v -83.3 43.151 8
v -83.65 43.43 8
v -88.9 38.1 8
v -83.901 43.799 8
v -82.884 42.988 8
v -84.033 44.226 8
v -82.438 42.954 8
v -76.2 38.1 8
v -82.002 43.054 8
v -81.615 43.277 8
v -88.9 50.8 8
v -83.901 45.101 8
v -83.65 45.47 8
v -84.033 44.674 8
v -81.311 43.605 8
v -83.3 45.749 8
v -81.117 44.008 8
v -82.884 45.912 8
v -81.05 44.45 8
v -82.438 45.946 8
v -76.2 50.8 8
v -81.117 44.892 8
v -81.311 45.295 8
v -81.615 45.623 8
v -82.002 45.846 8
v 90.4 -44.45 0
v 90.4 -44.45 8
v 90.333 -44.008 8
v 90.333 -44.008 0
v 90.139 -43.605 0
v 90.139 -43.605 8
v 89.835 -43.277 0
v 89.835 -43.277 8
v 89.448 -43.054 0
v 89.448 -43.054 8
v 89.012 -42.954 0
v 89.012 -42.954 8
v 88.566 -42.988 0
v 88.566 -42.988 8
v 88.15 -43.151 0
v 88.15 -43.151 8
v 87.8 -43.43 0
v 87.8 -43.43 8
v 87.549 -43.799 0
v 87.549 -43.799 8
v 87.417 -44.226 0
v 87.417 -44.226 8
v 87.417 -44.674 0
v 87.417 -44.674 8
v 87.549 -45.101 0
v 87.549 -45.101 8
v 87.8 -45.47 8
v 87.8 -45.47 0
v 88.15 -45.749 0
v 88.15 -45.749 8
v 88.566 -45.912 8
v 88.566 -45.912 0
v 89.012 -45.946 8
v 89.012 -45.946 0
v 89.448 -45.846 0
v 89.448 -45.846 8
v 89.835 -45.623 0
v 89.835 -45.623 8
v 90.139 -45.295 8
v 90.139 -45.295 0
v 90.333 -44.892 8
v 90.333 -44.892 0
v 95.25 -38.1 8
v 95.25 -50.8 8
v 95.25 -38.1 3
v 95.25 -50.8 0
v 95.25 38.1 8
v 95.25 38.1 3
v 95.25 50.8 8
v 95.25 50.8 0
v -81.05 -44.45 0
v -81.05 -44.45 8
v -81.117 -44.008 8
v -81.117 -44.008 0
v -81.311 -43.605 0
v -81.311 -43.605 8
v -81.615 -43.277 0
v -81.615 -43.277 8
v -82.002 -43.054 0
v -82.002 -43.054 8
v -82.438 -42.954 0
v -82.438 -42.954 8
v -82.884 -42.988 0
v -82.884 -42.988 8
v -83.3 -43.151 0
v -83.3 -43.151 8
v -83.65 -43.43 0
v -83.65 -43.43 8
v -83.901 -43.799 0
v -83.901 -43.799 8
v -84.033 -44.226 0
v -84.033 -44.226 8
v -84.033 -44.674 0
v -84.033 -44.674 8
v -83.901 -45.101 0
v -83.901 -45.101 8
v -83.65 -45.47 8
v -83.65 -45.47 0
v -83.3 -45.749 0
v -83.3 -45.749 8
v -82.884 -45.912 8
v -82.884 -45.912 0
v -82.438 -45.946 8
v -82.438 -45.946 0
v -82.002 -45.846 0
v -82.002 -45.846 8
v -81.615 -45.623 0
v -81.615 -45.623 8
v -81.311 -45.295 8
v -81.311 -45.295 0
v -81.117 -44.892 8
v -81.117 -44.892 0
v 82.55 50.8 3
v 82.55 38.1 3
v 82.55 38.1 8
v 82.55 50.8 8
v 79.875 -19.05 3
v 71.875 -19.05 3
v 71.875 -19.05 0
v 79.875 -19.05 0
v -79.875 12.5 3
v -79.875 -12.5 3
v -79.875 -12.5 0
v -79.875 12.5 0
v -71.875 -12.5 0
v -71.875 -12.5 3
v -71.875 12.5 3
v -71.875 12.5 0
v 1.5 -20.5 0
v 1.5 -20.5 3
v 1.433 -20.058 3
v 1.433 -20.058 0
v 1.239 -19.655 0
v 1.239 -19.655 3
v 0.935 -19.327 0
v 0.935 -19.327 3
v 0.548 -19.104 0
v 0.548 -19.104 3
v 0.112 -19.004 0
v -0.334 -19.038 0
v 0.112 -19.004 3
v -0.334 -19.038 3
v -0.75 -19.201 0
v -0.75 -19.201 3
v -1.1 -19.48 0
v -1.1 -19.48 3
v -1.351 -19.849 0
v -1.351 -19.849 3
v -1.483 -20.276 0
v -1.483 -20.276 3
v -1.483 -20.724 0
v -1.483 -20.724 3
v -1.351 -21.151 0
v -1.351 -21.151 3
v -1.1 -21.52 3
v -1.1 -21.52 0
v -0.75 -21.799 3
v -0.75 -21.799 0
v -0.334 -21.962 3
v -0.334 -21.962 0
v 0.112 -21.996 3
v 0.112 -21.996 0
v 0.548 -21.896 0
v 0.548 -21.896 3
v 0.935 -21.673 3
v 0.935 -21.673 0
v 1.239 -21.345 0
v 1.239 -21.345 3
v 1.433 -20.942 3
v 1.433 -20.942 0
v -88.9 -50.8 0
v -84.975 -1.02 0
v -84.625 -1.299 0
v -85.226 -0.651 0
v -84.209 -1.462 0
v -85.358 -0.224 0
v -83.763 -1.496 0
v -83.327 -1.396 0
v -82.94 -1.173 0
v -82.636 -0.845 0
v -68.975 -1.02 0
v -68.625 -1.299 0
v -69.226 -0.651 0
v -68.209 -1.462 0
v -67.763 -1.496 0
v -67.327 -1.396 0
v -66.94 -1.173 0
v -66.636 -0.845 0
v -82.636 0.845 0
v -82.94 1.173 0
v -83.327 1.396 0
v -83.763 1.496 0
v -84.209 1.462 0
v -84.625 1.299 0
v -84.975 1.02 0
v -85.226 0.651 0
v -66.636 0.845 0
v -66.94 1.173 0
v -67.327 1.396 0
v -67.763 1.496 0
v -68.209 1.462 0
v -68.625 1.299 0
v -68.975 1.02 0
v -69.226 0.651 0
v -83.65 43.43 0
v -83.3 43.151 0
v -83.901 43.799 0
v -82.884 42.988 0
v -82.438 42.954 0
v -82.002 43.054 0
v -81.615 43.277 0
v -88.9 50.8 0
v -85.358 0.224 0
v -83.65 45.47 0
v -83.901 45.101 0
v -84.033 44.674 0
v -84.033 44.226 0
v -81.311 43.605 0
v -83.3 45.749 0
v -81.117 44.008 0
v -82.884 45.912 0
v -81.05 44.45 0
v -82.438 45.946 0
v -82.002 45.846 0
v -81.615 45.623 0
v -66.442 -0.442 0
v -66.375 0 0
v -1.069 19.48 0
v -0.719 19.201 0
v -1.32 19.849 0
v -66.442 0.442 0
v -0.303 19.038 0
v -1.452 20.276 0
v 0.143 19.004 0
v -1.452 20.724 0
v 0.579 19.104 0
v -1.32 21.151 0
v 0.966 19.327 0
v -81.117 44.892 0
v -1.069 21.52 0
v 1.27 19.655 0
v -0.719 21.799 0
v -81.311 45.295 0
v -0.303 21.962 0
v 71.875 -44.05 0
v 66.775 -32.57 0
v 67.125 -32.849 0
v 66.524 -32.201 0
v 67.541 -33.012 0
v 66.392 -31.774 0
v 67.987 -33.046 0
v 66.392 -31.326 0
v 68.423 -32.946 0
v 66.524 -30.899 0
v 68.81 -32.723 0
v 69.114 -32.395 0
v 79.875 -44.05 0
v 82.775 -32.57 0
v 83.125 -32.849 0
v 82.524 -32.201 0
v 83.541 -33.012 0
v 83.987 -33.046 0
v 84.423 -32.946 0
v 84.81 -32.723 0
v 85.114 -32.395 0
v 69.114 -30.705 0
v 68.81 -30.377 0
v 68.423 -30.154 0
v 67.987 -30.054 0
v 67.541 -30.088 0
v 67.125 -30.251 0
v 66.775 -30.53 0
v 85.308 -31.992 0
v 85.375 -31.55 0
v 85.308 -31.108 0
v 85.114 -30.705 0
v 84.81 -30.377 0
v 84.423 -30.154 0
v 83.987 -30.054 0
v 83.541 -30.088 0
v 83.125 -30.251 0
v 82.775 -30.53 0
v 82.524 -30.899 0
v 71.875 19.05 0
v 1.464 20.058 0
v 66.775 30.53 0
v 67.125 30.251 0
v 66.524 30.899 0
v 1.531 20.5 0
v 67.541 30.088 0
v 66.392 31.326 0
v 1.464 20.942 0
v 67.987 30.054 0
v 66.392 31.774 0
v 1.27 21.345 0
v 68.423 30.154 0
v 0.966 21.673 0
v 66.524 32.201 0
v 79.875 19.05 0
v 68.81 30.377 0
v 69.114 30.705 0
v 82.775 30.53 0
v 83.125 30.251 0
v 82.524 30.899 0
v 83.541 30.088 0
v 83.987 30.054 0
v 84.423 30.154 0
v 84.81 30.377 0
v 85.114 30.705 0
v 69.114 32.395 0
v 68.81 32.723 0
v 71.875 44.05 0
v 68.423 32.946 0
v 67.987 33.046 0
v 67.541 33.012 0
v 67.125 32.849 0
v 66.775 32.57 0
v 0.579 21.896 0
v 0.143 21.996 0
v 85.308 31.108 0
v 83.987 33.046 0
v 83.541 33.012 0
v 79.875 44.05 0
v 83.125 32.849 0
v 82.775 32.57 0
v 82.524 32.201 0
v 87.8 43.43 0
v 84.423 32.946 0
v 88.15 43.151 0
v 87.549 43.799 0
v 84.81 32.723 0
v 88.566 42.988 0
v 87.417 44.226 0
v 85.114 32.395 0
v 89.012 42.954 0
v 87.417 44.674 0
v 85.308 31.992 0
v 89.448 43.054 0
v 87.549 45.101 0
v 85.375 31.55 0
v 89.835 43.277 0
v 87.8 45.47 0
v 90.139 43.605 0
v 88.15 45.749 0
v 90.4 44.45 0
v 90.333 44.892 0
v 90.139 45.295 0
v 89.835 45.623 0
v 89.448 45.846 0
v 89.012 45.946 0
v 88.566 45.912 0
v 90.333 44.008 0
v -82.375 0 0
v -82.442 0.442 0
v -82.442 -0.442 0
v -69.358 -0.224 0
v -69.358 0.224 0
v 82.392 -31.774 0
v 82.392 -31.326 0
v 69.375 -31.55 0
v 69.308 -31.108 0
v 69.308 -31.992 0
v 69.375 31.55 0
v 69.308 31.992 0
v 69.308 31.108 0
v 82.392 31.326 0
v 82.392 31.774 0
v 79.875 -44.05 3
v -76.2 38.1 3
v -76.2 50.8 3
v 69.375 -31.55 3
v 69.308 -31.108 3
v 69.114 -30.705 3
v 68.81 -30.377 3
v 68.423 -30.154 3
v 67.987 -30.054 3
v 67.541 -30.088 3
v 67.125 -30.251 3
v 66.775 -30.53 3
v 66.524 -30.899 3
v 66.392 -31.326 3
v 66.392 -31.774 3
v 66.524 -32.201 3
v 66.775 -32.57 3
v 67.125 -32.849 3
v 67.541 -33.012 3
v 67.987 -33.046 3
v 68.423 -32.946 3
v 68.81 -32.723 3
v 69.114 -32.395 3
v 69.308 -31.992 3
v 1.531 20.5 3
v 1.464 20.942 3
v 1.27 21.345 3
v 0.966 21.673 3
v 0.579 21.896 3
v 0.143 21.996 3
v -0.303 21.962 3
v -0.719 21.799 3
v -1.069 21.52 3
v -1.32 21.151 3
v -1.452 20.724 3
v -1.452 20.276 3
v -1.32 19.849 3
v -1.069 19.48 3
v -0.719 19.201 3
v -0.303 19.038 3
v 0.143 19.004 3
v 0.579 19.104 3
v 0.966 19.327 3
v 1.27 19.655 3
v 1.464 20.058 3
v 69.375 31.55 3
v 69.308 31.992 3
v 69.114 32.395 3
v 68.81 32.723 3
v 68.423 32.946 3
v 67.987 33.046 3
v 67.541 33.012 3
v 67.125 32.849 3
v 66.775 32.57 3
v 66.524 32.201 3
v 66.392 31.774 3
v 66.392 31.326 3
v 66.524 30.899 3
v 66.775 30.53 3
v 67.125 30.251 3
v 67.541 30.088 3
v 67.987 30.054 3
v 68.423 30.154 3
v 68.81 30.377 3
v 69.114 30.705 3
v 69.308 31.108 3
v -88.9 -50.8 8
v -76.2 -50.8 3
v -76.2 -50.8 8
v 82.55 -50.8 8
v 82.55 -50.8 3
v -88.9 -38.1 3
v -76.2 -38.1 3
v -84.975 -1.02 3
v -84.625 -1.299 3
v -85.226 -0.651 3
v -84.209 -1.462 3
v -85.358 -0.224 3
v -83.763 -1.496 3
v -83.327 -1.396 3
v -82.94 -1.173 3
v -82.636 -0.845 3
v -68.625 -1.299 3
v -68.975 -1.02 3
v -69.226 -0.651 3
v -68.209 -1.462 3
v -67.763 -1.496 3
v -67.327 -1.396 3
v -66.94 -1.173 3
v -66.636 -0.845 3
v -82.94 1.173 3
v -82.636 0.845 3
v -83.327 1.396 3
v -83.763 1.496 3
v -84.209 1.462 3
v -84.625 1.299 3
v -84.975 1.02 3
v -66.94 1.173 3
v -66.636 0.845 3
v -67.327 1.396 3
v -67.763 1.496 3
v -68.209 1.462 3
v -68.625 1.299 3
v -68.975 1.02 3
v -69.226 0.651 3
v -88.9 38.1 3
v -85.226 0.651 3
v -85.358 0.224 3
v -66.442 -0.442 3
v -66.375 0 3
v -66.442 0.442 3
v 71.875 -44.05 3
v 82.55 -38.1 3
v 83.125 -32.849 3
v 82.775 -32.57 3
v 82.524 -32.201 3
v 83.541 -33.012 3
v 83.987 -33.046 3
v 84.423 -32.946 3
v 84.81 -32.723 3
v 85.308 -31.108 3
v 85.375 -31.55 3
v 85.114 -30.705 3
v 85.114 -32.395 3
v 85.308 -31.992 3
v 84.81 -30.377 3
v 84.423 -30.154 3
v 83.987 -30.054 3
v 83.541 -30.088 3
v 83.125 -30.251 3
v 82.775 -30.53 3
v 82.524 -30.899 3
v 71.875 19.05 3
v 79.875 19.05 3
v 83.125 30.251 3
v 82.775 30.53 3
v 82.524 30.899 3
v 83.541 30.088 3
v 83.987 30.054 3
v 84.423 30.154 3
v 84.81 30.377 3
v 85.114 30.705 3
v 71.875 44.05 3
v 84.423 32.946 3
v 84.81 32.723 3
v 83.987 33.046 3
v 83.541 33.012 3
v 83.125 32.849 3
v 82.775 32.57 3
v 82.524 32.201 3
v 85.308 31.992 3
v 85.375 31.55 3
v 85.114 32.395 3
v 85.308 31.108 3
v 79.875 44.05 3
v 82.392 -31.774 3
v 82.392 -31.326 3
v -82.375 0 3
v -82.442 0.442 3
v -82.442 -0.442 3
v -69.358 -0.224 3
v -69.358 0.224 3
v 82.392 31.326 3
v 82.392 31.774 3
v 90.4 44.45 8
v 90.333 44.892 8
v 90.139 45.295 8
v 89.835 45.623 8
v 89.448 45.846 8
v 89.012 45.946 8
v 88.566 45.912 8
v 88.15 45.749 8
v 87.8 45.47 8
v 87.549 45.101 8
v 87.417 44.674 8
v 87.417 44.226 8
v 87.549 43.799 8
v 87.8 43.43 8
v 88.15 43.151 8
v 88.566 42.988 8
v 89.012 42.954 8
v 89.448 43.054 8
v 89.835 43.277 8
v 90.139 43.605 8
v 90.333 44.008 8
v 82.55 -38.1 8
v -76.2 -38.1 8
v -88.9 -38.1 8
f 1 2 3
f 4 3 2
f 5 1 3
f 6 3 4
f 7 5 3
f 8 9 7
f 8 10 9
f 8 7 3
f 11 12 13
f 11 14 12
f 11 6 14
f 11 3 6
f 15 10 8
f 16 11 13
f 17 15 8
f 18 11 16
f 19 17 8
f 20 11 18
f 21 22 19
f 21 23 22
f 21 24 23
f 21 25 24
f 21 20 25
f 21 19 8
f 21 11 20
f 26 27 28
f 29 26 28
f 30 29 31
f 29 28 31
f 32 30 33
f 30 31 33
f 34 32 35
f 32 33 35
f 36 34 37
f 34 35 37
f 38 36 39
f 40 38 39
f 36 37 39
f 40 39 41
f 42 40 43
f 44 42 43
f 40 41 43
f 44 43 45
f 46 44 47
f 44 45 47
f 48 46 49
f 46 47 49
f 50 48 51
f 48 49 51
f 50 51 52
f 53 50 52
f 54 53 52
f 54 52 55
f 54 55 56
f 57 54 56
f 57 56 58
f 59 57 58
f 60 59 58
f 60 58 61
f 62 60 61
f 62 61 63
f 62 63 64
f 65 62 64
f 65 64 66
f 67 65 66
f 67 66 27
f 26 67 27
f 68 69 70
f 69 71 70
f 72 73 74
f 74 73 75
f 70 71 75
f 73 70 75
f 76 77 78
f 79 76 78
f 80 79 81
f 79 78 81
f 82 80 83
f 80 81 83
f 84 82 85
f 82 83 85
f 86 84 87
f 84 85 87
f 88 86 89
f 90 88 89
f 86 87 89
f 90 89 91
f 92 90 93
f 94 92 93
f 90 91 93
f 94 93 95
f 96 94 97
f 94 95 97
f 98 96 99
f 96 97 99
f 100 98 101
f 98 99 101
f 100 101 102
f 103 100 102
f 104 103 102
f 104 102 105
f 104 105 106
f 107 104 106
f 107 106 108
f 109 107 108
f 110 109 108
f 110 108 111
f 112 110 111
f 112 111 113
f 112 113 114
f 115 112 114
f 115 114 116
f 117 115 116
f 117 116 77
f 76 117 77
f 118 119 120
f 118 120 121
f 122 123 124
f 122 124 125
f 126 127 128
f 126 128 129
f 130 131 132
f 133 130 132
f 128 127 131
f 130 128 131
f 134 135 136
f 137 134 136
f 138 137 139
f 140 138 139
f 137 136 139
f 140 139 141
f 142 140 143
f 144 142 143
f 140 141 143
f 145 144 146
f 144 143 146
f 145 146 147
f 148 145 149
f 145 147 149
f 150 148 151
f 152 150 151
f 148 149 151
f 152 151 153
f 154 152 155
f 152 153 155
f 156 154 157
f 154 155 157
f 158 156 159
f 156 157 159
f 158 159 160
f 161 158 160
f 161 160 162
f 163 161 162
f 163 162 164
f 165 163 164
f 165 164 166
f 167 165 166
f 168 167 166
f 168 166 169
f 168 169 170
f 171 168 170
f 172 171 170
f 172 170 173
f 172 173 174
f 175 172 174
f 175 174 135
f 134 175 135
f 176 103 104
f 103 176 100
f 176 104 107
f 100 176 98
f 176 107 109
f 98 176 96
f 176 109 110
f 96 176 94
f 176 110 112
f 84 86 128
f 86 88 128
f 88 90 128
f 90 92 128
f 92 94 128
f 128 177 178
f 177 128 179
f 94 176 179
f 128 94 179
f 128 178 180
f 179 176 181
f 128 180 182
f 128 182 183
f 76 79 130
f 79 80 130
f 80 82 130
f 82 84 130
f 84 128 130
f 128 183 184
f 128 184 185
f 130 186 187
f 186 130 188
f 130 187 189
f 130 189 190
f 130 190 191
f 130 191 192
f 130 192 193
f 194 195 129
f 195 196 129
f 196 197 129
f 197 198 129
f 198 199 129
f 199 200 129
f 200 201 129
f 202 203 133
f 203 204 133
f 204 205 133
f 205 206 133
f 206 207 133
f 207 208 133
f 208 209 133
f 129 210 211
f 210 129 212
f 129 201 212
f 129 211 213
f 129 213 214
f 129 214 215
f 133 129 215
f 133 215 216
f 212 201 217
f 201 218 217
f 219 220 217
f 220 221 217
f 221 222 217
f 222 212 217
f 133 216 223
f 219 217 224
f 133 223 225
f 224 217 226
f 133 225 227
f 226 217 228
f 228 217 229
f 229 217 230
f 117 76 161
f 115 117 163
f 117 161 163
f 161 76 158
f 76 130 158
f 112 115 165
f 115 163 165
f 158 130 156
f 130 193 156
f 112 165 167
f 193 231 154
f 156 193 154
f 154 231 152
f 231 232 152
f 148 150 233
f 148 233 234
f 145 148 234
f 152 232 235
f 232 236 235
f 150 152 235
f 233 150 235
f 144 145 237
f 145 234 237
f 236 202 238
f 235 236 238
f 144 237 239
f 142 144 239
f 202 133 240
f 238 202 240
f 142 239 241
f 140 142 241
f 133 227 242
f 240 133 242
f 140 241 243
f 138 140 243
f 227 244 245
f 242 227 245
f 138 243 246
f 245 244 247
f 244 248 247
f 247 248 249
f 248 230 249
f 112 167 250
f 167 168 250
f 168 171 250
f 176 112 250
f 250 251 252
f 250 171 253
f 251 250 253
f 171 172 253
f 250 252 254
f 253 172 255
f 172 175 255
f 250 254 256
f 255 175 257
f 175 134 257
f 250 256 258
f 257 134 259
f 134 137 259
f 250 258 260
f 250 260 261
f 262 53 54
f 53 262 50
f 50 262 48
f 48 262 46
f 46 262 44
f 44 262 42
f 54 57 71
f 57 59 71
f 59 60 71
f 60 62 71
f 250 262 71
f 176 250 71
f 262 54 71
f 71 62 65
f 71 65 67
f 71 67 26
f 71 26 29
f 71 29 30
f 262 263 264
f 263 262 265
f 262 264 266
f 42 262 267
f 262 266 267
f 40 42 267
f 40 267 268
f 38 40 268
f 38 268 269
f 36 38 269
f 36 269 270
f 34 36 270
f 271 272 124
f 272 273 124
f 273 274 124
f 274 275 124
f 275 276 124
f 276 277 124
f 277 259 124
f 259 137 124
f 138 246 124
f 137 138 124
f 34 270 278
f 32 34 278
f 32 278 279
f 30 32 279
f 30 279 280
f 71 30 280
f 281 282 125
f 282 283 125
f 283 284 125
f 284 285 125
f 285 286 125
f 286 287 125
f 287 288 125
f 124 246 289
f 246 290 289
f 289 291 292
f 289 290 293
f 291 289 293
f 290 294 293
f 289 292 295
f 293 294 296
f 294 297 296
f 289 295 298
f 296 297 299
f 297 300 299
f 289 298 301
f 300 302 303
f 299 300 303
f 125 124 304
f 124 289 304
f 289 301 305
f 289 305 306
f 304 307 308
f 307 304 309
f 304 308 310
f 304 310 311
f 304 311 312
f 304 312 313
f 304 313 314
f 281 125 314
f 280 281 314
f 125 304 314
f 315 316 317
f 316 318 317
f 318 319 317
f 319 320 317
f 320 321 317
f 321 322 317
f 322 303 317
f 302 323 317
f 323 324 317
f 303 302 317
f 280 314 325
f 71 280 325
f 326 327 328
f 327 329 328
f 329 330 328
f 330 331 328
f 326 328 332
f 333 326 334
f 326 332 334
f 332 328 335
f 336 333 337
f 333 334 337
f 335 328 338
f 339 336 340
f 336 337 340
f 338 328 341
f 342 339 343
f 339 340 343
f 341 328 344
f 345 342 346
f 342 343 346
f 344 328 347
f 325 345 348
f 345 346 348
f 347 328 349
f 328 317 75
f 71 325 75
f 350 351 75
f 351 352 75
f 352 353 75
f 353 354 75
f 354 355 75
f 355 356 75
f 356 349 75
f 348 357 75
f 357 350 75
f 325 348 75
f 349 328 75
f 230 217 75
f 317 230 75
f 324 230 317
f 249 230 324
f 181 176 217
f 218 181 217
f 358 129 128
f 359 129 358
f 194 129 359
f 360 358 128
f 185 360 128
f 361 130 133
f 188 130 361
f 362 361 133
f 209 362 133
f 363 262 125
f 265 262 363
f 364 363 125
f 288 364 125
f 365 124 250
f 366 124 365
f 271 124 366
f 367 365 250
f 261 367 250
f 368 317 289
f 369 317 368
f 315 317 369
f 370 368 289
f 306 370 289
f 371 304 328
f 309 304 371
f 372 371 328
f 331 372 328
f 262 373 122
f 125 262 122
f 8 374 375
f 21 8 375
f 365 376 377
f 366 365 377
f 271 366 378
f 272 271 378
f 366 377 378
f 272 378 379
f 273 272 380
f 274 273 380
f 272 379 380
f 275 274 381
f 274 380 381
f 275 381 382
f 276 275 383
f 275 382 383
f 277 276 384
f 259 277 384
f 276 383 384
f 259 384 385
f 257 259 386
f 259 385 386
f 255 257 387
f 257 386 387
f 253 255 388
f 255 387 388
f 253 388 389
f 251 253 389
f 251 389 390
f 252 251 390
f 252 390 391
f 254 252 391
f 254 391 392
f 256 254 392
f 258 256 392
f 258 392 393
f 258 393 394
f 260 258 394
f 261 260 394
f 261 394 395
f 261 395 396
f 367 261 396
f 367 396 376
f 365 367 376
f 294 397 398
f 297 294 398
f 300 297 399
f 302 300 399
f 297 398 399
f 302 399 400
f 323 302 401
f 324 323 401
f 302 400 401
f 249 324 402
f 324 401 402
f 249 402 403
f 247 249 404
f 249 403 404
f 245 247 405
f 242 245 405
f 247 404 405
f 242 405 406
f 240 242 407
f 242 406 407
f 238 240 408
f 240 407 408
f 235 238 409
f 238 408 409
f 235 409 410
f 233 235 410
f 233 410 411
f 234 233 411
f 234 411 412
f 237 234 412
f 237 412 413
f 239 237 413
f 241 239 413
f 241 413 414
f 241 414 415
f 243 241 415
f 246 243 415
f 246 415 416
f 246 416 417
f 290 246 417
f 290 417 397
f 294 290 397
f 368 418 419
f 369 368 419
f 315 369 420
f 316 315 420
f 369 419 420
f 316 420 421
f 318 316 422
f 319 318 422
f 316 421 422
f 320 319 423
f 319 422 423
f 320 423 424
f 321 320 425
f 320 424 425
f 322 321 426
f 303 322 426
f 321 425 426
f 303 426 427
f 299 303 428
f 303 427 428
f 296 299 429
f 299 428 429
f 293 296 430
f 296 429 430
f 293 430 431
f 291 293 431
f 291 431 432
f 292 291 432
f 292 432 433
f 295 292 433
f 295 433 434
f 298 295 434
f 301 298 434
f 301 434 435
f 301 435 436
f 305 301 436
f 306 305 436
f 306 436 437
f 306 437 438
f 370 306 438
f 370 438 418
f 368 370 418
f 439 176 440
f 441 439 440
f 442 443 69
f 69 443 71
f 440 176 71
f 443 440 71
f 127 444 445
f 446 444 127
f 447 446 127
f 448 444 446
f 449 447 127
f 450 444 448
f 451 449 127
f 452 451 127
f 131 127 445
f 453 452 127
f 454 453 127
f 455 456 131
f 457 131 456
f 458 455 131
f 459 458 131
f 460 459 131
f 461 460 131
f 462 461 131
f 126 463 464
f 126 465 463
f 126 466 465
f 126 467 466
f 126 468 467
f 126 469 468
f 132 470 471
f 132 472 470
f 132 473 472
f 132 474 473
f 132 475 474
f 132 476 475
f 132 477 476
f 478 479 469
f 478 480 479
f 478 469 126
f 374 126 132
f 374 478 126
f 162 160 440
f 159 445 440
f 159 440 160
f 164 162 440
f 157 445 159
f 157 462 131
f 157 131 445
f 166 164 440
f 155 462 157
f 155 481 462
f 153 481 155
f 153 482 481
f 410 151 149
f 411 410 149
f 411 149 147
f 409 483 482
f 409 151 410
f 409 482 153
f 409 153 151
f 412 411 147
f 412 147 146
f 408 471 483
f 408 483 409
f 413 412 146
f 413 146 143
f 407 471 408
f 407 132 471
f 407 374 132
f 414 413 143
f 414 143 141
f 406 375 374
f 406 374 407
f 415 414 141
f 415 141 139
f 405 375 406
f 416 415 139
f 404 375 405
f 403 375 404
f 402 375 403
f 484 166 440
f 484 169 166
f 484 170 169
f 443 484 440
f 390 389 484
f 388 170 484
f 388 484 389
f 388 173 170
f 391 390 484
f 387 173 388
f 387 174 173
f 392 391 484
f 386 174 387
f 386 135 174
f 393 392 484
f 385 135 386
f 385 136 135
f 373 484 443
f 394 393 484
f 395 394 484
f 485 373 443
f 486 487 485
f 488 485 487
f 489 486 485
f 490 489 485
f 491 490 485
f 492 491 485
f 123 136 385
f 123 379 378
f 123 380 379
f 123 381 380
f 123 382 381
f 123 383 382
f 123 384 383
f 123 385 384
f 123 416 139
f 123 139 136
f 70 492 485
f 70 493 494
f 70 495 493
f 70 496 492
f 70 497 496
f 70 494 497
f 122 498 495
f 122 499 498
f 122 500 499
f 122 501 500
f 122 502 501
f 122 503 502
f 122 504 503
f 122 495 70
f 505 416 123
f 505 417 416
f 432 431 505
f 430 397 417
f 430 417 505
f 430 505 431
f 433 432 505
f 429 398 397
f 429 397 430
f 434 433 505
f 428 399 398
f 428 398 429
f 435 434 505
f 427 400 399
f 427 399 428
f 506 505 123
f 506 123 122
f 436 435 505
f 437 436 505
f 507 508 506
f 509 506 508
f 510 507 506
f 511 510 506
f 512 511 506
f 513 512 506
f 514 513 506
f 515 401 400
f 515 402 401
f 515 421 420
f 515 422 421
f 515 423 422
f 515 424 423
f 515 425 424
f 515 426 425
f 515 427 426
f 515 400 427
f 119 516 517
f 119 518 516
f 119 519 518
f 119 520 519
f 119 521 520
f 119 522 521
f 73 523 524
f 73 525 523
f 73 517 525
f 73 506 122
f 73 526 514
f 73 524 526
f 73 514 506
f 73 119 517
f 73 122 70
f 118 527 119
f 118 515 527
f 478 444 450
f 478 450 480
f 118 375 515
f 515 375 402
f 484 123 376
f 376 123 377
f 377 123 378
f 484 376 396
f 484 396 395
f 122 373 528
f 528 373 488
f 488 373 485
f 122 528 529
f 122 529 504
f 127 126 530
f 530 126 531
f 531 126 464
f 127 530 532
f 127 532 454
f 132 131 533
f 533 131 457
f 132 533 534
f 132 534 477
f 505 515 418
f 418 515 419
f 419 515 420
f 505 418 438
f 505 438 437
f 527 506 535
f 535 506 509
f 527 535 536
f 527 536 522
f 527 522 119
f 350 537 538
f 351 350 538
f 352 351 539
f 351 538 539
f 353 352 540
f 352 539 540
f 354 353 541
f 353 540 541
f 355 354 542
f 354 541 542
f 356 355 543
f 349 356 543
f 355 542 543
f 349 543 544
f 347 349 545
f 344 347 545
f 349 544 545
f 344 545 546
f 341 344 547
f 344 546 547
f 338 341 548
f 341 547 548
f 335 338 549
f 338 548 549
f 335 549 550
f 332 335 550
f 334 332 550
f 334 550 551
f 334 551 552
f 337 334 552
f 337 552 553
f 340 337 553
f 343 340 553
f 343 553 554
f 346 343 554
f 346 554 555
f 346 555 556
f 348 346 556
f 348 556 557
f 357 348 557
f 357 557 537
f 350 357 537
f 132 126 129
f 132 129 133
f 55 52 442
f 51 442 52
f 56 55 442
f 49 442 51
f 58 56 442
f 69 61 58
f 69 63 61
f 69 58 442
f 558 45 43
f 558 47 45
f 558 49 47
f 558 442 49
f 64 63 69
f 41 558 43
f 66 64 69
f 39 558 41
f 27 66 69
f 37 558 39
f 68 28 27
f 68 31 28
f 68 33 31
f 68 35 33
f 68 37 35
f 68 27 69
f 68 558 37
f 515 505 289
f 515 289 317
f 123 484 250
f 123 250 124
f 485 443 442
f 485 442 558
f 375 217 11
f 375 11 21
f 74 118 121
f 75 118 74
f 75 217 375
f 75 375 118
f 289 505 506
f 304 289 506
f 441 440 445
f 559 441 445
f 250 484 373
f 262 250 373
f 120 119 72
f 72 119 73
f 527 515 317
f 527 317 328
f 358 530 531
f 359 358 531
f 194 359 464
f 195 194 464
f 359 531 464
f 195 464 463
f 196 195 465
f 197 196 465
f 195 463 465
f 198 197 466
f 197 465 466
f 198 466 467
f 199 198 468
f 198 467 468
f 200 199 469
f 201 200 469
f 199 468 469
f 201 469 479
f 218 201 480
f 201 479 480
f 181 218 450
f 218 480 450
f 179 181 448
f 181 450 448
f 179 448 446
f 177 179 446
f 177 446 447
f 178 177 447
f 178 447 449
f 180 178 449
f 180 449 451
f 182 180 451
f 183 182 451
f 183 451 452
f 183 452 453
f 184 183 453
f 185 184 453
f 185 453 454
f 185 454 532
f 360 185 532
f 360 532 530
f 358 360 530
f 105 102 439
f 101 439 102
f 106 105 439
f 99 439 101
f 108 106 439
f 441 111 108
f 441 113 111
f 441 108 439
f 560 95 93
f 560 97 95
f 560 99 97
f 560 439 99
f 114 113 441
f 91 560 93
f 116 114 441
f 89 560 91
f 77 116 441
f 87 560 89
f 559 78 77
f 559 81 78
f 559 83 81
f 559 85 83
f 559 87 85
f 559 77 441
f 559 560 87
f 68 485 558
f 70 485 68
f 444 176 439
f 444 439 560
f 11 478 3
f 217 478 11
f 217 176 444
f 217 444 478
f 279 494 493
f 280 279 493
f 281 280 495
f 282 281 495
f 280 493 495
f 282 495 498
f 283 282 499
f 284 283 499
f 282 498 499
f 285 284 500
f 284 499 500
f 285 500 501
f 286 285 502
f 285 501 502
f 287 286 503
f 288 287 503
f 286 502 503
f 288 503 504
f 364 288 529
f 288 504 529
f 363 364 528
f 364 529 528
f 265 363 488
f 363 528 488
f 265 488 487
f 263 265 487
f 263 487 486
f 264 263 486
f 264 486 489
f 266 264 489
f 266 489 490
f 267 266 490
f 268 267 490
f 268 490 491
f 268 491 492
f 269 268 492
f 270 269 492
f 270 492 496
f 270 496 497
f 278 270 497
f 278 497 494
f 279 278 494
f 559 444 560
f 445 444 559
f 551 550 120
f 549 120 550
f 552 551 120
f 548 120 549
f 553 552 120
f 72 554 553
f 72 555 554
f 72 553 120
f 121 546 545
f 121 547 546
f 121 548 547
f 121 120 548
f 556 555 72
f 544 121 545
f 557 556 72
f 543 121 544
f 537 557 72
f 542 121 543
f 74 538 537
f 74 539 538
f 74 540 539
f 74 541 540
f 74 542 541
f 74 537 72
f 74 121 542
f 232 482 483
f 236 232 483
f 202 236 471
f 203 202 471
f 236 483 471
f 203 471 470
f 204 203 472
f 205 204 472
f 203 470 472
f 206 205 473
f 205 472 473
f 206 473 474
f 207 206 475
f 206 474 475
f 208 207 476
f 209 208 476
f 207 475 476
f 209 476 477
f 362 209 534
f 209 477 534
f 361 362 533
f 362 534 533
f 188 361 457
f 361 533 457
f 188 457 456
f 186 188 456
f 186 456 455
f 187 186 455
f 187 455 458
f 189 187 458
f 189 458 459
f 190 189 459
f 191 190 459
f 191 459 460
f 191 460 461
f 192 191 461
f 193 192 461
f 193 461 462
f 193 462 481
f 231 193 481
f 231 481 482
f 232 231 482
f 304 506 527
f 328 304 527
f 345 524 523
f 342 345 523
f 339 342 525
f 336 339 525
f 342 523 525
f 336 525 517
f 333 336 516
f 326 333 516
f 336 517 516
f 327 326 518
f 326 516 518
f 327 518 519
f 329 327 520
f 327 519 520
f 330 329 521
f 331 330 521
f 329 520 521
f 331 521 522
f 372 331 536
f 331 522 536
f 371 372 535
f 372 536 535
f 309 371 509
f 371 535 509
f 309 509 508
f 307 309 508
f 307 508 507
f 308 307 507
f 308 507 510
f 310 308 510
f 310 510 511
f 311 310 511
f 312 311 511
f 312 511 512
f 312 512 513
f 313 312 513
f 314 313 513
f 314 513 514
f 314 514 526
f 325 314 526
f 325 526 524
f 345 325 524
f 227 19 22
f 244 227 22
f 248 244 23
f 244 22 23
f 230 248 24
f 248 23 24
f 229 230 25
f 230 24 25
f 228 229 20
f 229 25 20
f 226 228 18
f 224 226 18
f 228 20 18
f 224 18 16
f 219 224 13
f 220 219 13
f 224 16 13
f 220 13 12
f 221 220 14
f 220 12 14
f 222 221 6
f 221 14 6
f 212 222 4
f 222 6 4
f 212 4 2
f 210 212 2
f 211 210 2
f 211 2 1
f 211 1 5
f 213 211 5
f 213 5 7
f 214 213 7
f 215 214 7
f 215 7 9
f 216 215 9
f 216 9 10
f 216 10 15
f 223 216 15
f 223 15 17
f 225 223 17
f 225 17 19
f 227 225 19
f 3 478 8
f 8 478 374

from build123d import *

# Parameters (mm, degrees)
F0_W     = 184.15
F0_H     = 101.6
F1_DEPTH = 3
F3_W     = 8
F3_H     = 25
F3_R     = 1.5
F2_R     = 1.5
F2_R_2   = 2.25
F4_DEPTH = 3.001
F5_W     = 12.7
F5_H     = 12.7
F6_DEPTH = 5
F7_R     = 1.5
F8_DEPTH = 8.001


with BuildPart() as f1:
    # F0 (on Top) → F1 (new body)
    with BuildSketch(Plane.XY):
        with Locations((3.175, 0)):
            Rectangle(F0_W, F0_H)
    extrude(amount=F1_DEPTH)

    # F3 (on face) + F2 (on Top) → F4 (cut, through all)
    with BuildSketch(Plane.XY.offset(3)):
        with Locations((75.875, 31.55)):
            Rectangle(F3_W, F3_H)
        with Locations((-75.875, 0)):
            Rectangle(F3_W, F3_H)
        with Locations((75.875, -31.55)):
            Rectangle(F3_W, F3_H)
        with Locations((-67.875, 0)):
            Circle(F3_R)
        with Locations((-83.875, 0)):
            Circle(F3_R)
        with Locations((83.875, 31.55)):
            Circle(F3_R)
        with Locations((67.875, 31.55)):
            Circle(F3_R)
        with Locations((83.875, -31.55)):
            Circle(F3_R)
        with Locations((67.875, -31.55)):
            Circle(F3_R)
        with Locations((0.03105, 20.5)):
            Circle(F3_R)
        with Locations((0, -20.5)):
            Circle(F3_R)
    with BuildSketch(Plane.XY):
        with BuildLine():
            Line((103.423341, 112.311256), (-105.576659, 112.311256))
            ThreePointArc((-105.576659, 112.311256), (-110.87996, 110.114557), (-113.076659, 104.811256))
            Line((-113.076659, 104.811256), (-113.076659, -104.188744))
            ThreePointArc((-113.076659, -104.188744), (-110.87996, -109.492044), (-105.576659, -111.688744))
            Line((-105.576659, -111.688744), (103.423341, -111.688744))
            ThreePointArc((103.423341, -111.688744), (108.726642, -109.492044), (110.923341, -104.188744))
            Line((110.923341, -104.188744), (110.923341, 104.811256))
            ThreePointArc((110.923341, 104.811256), (108.726642, 110.114557), (103.423341, 112.311256))
        make_face()
        with Locations((-105.576659, -104.188744)):
            Circle(F2_R, mode=Mode.SUBTRACT)
        with BuildLine():
            Line((-73.691883, -86.446103), (-28.691883, -41.446103))
            ThreePointArc((-28.691883, -41.446103), (-26.745343, -40.145466), (-24.449242, -39.688744))
            Line((-24.449242, -39.688744), (-12.076659, -39.688744))
            ThreePointArc((-12.076659, -39.688744), (-7.834019, -41.446103), (-6.076659, -45.688744))
            Line((-6.076659, -45.688744), (-6.076659, -90.688744))
            ThreePointArc((-6.076659, -90.688744), (-7.834019, -94.931384), (-12.076659, -96.688744))
            Line((-12.076659, -96.688744), (-69.449242, -96.688744))
            ThreePointArc((-69.449242, -96.688744), (-74.992519, -92.984844), (-73.691883, -86.446103))
        make_face(mode=Mode.SUBTRACT)
        with Locations((-98.576659, -39.688744)):
            Circle(F2_R_2, mode=Mode.SUBTRACT)
        with BuildLine():
            Line((-90.676659, -24.688744), (-86.476659, -24.688744))
            ThreePointArc((-86.476659, -24.688744), (-84.355339, -25.567423), (-83.476659, -27.688744))
            Line((-83.476659, -27.688744), (-83.476659, -51.688744))
            ThreePointArc((-83.476659, -51.688744), (-84.355339, -53.810064), (-86.476659, -54.688744))
            Line((-86.476659, -54.688744), (-90.676659, -54.688744))
            ThreePointArc((-90.676659, -54.688744), (-92.79798, -53.810064), (-93.676659, -51.688744))
            Line((-93.676659, -51.688744), (-93.676659, -27.688744))
            ThreePointArc((-93.676659, -27.688744), (-92.79798, -25.567423), (-90.676659, -24.688744))
        make_face(mode=Mode.SUBTRACT)
        with Locations((-78.576659, -39.688744)):
            Circle(F2_R_2, mode=Mode.SUBTRACT)
        with BuildLine():
            ThreePointArc((22.295924, -39.688744), (24.592024, -40.145466), (26.538564, -41.446103))
            Line((26.538564, -41.446103), (71.538564, -86.446103))
            ThreePointArc((71.538564, -86.446103), (72.839201, -92.984844), (67.295924, -96.688744))
            Line((67.295924, -96.688744), (9.923341, -96.688744))
            ThreePointArc((9.923341, -96.688744), (5.6807, -94.931384), (3.923341, -90.688744))
            Line((3.923341, -90.688744), (3.923341, -45.688744))
            ThreePointArc((3.923341, -45.688744), (5.6807, -41.446103), (9.923341, -39.688744))
            Line((9.923341, -39.688744), (22.295924, -39.688744))
        make_face(mode=Mode.SUBTRACT)
        with Locations((103.423341, -104.188744)):
            Circle(F2_R, mode=Mode.SUBTRACT)
        with Locations((-1.076659, -20.188744)):
            Circle(F2_R, mode=Mode.SUBTRACT)
        with BuildLine():
            ThreePointArc((95.923341, -68.061327), (92.219441, -73.604604), (85.6807, -72.303967))
            Line((85.6807, -72.303967), (49.165981, -35.789249))
            ThreePointArc((49.165981, -35.789249), (47.865345, -29.250507), (53.408622, -25.546608))
            Line((53.408622, -25.546608), (89.923341, -25.546608))
            ThreePointArc((89.923341, -25.546608), (94.165981, -27.303967), (95.923341, -31.546608))
            Line((95.923341, -31.546608), (95.923341, -68.061327))
        make_face(mode=Mode.SUBTRACT)
        with BuildLine():
            Line((84.323341, 15.311256), (88.523341, 15.311256))
            ThreePointArc((88.523341, 15.311256), (90.644661, 14.432577), (91.523341, 12.311256))
            Line((91.523341, 12.311256), (91.523341, -11.688744))
            ThreePointArc((91.523341, -11.688744), (90.644661, -13.810064), (88.523341, -14.688744))
            Line((88.523341, -14.688744), (84.323341, -14.688744))
            ThreePointArc((84.323341, -14.688744), (82.20202, -13.810064), (81.323341, -11.688744))
            Line((81.323341, -11.688744), (81.323341, 12.311256))
            ThreePointArc((81.323341, 12.311256), (82.20202, 14.432577), (84.323341, 15.311256))
        make_face(mode=Mode.SUBTRACT)
        with Locations((-98.576659, 40.311256)):
            Circle(F2_R_2, mode=Mode.SUBTRACT)
        with BuildLine():
            ThreePointArc((-83.476659, 28.311256), (-84.355339, 26.189936), (-86.476659, 25.311256))
            Line((-86.476659, 25.311256), (-90.676659, 25.311256))
            ThreePointArc((-90.676659, 25.311256), (-92.79798, 26.189936), (-93.676659, 28.311256))
            Line((-93.676659, 28.311256), (-93.676659, 52.311256))
            ThreePointArc((-93.676659, 52.311256), (-92.79798, 54.432577), (-90.676659, 55.311256))
            Line((-90.676659, 55.311256), (-86.476659, 55.311256))
            ThreePointArc((-86.476659, 55.311256), (-84.355339, 54.432577), (-83.476659, 52.311256))
            Line((-83.476659, 52.311256), (-83.476659, 28.311256))
        make_face(mode=Mode.SUBTRACT)
        with Locations((-78.576659, 40.311256)):
            Circle(F2_R_2, mode=Mode.SUBTRACT)
        with Locations((-105.576659, 104.811256)):
            Circle(F2_R, mode=Mode.SUBTRACT)
        with BuildLine():
            ThreePointArc((-12.076659, 97.311256), (-7.834019, 95.553897), (-6.076659, 91.311256))
            Line((-6.076659, 91.311256), (-6.076659, 46.311256))
            ThreePointArc((-6.076659, 46.311256), (-7.834019, 42.068616), (-12.076659, 40.311256))
            Line((-12.076659, 40.311256), (-24.449242, 40.311256))
            ThreePointArc((-24.449242, 40.311256), (-26.745343, 40.767979), (-28.691883, 42.068616))
            Line((-28.691883, 42.068616), (-73.691883, 87.068616))
            ThreePointArc((-73.691883, 87.068616), (-74.992519, 93.607357), (-69.449242, 97.311256))
            Line((-69.449242, 97.311256), (-12.076659, 97.311256))
        make_face(mode=Mode.SUBTRACT)
        with Locations((-1.076659, 20.811256)):
            Circle(F2_R, mode=Mode.SUBTRACT)
        with Locations((76.423341, 0.311256)):
            Circle(F2_R_2, mode=Mode.SUBTRACT)
        with Locations((96.423341, 0.311256)):
            Circle(F2_R_2, mode=Mode.SUBTRACT)
        with BuildLine():
            ThreePointArc((53.408622, 26.169121), (47.865345, 29.87302), (49.165981, 36.411762))
            Line((49.165981, 36.411762), (85.6807, 72.92648))
            ThreePointArc((85.6807, 72.92648), (92.219441, 74.227117), (95.923341, 68.683839))
            Line((95.923341, 68.683839), (95.923341, 32.169121))
            ThreePointArc((95.923341, 32.169121), (94.165981, 27.92648), (89.923341, 26.169121))
            Line((89.923341, 26.169121), (53.408622, 26.169121))
        make_face(mode=Mode.SUBTRACT)
        with BuildLine():
            Line((3.923341, 46.311256), (3.923341, 91.311256))
            ThreePointArc((3.923341, 91.311256), (5.6807, 95.553897), (9.923341, 97.311256))
            Line((9.923341, 97.311256), (67.295924, 97.311256))
            ThreePointArc((67.295924, 97.311256), (72.839201, 93.607357), (71.538564, 87.068616))
            Line((71.538564, 87.068616), (26.538564, 42.068616))
            ThreePointArc((26.538564, 42.068616), (24.592024, 40.767979), (22.295924, 40.311256))
            Line((22.295924, 40.311256), (9.923341, 40.311256))
            ThreePointArc((9.923341, 40.311256), (5.6807, 42.068616), (3.923341, 46.311256))
        make_face(mode=Mode.SUBTRACT)
        with Locations((103.423341, 104.811256)):
            Circle(F2_R, mode=Mode.SUBTRACT)
    extrude(amount=-F4_DEPTH, mode=Mode.SUBTRACT)

    # F5 (on face) → F6 (join)
    with BuildSketch(Plane.XY.offset(3)):
        with Locations((88.9, -44.45)):
            Rectangle(F5_W, F5_H)
        with Locations((-82.55, -44.45)):
            Rectangle(F5_W, F5_H)
        with Locations((-82.55, 44.45)):
            Rectangle(F5_W, F5_H)
        with Locations((88.9, 44.45)):
            Rectangle(F5_W, F5_H)
    extrude(amount=F6_DEPTH)

    # F7 (on face) → F8 (cut, through all)
    with BuildSketch(Plane.XY.offset(8)):
        with Locations((-82.55, 44.45)):
            Circle(F7_R)
        with Locations((88.9, 44.45)):
            Circle(F7_R)
        with Locations((88.9, -44.45)):
            Circle(F7_R)
        with Locations((-82.55, -44.45)):
            Circle(F7_R)
    extrude(amount=-F8_DEPTH, mode=Mode.SUBTRACT)


solid = f1.part
